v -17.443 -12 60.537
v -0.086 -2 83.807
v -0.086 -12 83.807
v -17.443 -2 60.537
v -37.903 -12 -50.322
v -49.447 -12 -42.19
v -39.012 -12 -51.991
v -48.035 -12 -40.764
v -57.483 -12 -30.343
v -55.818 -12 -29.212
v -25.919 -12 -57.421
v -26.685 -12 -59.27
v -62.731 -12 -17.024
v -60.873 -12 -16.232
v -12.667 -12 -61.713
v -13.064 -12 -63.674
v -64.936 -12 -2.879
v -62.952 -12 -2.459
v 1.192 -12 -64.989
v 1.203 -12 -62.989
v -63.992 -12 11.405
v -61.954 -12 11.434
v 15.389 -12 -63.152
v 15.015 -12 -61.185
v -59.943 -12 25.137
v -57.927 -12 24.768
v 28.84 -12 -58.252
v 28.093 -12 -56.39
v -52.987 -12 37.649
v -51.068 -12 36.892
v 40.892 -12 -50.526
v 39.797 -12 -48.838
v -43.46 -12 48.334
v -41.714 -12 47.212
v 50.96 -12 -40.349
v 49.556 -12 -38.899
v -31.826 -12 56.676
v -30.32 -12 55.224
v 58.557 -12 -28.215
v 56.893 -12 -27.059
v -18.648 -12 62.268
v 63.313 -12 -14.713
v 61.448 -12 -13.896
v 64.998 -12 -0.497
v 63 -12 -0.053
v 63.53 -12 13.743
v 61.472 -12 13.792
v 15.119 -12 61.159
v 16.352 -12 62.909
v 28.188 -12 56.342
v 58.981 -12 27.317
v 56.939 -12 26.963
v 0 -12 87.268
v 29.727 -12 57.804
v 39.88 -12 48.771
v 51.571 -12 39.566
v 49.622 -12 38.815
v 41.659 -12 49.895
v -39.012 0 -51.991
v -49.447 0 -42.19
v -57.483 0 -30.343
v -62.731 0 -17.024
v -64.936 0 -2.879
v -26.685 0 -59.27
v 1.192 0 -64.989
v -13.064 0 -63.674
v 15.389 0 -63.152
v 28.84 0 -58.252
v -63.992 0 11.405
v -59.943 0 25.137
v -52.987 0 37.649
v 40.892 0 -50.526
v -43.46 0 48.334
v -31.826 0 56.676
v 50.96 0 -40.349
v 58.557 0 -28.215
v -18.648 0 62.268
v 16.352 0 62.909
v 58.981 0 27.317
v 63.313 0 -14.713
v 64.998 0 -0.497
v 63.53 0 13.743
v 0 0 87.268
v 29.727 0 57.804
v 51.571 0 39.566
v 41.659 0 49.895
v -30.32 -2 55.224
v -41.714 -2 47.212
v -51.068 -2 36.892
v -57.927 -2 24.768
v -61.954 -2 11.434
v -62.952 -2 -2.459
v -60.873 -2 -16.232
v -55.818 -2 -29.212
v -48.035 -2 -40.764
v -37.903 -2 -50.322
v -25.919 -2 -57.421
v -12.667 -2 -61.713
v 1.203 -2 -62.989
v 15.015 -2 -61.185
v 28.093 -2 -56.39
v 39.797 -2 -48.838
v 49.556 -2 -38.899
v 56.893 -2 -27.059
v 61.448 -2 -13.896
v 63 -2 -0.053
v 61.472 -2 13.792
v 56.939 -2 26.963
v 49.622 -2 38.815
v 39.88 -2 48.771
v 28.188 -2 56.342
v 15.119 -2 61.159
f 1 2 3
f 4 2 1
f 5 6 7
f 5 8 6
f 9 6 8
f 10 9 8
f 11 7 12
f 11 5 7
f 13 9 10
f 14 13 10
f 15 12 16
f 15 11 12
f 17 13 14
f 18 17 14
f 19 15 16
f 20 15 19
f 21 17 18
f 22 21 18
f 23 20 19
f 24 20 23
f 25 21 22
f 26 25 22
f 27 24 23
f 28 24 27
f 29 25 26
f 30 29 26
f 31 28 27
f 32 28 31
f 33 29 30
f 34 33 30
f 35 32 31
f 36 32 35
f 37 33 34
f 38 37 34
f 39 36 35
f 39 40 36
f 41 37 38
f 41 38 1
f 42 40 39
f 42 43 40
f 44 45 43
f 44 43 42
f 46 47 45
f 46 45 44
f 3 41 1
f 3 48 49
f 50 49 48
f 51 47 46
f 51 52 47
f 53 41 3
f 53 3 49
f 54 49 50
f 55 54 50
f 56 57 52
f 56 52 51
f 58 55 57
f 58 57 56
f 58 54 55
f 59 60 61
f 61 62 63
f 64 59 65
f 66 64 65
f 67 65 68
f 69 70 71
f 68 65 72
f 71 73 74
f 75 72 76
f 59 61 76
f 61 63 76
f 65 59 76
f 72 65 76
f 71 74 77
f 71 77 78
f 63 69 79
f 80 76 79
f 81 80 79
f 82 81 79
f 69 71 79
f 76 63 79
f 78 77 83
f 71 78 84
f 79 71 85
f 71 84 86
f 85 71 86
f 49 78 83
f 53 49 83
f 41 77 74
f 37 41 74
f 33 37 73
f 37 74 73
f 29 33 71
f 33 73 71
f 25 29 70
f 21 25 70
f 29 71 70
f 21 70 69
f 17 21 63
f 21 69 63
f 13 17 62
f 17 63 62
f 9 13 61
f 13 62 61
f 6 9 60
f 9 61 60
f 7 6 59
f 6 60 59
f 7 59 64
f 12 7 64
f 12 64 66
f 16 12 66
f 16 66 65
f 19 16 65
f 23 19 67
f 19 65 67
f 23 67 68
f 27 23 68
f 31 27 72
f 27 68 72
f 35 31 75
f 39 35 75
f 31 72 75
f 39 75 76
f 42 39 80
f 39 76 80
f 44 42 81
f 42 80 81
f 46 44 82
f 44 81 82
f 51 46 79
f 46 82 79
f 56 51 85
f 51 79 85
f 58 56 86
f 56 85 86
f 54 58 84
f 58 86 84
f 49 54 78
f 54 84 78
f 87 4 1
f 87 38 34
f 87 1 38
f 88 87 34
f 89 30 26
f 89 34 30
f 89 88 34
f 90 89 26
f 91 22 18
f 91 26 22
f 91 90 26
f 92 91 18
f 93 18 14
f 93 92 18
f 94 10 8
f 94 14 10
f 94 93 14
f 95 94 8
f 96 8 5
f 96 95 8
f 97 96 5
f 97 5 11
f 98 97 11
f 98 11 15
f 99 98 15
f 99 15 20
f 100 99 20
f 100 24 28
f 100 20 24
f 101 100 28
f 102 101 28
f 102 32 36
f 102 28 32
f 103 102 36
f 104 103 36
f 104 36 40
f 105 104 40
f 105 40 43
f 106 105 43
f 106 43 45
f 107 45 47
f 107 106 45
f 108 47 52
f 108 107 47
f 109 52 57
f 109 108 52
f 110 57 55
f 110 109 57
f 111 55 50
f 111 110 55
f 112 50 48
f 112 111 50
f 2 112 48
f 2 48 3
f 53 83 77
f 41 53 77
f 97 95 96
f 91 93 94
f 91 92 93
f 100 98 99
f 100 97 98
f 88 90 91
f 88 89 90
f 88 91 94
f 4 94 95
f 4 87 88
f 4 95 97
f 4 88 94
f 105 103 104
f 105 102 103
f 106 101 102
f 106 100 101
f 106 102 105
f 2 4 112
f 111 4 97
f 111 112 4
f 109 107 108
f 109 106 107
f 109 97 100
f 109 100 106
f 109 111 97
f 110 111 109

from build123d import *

# Parameters (mm, degrees)
F1_DEPTH = 12
F2_T     = -2


with BuildPart() as f1:
    # F0 (on Front) → F1 (new body)
    with BuildSketch(Plane.XZ):
        with BuildLine():
            Line((0, 87.2677220979), (-18.6475409836, 62.2677220979))
            ThreePointArc((-18.6475409836, 62.2677220979), (1.1915533371, -64.9890775488), (16.3524590164, 62.909435573))
            Line((16.3524590164, 62.909435573), (0, 87.2677220979))
        make_face()
    extrude(amount=F1_DEPTH)

    # F2
    f2_openings = [f1.faces().sort_by_distance(p)[0] for p in [
        (-0.019386, -12, 1.977046),
    ]]
    offset(amount=F2_T, openings=f2_openings, kind=Kind.INTERSECTION)


solid = f1.part
